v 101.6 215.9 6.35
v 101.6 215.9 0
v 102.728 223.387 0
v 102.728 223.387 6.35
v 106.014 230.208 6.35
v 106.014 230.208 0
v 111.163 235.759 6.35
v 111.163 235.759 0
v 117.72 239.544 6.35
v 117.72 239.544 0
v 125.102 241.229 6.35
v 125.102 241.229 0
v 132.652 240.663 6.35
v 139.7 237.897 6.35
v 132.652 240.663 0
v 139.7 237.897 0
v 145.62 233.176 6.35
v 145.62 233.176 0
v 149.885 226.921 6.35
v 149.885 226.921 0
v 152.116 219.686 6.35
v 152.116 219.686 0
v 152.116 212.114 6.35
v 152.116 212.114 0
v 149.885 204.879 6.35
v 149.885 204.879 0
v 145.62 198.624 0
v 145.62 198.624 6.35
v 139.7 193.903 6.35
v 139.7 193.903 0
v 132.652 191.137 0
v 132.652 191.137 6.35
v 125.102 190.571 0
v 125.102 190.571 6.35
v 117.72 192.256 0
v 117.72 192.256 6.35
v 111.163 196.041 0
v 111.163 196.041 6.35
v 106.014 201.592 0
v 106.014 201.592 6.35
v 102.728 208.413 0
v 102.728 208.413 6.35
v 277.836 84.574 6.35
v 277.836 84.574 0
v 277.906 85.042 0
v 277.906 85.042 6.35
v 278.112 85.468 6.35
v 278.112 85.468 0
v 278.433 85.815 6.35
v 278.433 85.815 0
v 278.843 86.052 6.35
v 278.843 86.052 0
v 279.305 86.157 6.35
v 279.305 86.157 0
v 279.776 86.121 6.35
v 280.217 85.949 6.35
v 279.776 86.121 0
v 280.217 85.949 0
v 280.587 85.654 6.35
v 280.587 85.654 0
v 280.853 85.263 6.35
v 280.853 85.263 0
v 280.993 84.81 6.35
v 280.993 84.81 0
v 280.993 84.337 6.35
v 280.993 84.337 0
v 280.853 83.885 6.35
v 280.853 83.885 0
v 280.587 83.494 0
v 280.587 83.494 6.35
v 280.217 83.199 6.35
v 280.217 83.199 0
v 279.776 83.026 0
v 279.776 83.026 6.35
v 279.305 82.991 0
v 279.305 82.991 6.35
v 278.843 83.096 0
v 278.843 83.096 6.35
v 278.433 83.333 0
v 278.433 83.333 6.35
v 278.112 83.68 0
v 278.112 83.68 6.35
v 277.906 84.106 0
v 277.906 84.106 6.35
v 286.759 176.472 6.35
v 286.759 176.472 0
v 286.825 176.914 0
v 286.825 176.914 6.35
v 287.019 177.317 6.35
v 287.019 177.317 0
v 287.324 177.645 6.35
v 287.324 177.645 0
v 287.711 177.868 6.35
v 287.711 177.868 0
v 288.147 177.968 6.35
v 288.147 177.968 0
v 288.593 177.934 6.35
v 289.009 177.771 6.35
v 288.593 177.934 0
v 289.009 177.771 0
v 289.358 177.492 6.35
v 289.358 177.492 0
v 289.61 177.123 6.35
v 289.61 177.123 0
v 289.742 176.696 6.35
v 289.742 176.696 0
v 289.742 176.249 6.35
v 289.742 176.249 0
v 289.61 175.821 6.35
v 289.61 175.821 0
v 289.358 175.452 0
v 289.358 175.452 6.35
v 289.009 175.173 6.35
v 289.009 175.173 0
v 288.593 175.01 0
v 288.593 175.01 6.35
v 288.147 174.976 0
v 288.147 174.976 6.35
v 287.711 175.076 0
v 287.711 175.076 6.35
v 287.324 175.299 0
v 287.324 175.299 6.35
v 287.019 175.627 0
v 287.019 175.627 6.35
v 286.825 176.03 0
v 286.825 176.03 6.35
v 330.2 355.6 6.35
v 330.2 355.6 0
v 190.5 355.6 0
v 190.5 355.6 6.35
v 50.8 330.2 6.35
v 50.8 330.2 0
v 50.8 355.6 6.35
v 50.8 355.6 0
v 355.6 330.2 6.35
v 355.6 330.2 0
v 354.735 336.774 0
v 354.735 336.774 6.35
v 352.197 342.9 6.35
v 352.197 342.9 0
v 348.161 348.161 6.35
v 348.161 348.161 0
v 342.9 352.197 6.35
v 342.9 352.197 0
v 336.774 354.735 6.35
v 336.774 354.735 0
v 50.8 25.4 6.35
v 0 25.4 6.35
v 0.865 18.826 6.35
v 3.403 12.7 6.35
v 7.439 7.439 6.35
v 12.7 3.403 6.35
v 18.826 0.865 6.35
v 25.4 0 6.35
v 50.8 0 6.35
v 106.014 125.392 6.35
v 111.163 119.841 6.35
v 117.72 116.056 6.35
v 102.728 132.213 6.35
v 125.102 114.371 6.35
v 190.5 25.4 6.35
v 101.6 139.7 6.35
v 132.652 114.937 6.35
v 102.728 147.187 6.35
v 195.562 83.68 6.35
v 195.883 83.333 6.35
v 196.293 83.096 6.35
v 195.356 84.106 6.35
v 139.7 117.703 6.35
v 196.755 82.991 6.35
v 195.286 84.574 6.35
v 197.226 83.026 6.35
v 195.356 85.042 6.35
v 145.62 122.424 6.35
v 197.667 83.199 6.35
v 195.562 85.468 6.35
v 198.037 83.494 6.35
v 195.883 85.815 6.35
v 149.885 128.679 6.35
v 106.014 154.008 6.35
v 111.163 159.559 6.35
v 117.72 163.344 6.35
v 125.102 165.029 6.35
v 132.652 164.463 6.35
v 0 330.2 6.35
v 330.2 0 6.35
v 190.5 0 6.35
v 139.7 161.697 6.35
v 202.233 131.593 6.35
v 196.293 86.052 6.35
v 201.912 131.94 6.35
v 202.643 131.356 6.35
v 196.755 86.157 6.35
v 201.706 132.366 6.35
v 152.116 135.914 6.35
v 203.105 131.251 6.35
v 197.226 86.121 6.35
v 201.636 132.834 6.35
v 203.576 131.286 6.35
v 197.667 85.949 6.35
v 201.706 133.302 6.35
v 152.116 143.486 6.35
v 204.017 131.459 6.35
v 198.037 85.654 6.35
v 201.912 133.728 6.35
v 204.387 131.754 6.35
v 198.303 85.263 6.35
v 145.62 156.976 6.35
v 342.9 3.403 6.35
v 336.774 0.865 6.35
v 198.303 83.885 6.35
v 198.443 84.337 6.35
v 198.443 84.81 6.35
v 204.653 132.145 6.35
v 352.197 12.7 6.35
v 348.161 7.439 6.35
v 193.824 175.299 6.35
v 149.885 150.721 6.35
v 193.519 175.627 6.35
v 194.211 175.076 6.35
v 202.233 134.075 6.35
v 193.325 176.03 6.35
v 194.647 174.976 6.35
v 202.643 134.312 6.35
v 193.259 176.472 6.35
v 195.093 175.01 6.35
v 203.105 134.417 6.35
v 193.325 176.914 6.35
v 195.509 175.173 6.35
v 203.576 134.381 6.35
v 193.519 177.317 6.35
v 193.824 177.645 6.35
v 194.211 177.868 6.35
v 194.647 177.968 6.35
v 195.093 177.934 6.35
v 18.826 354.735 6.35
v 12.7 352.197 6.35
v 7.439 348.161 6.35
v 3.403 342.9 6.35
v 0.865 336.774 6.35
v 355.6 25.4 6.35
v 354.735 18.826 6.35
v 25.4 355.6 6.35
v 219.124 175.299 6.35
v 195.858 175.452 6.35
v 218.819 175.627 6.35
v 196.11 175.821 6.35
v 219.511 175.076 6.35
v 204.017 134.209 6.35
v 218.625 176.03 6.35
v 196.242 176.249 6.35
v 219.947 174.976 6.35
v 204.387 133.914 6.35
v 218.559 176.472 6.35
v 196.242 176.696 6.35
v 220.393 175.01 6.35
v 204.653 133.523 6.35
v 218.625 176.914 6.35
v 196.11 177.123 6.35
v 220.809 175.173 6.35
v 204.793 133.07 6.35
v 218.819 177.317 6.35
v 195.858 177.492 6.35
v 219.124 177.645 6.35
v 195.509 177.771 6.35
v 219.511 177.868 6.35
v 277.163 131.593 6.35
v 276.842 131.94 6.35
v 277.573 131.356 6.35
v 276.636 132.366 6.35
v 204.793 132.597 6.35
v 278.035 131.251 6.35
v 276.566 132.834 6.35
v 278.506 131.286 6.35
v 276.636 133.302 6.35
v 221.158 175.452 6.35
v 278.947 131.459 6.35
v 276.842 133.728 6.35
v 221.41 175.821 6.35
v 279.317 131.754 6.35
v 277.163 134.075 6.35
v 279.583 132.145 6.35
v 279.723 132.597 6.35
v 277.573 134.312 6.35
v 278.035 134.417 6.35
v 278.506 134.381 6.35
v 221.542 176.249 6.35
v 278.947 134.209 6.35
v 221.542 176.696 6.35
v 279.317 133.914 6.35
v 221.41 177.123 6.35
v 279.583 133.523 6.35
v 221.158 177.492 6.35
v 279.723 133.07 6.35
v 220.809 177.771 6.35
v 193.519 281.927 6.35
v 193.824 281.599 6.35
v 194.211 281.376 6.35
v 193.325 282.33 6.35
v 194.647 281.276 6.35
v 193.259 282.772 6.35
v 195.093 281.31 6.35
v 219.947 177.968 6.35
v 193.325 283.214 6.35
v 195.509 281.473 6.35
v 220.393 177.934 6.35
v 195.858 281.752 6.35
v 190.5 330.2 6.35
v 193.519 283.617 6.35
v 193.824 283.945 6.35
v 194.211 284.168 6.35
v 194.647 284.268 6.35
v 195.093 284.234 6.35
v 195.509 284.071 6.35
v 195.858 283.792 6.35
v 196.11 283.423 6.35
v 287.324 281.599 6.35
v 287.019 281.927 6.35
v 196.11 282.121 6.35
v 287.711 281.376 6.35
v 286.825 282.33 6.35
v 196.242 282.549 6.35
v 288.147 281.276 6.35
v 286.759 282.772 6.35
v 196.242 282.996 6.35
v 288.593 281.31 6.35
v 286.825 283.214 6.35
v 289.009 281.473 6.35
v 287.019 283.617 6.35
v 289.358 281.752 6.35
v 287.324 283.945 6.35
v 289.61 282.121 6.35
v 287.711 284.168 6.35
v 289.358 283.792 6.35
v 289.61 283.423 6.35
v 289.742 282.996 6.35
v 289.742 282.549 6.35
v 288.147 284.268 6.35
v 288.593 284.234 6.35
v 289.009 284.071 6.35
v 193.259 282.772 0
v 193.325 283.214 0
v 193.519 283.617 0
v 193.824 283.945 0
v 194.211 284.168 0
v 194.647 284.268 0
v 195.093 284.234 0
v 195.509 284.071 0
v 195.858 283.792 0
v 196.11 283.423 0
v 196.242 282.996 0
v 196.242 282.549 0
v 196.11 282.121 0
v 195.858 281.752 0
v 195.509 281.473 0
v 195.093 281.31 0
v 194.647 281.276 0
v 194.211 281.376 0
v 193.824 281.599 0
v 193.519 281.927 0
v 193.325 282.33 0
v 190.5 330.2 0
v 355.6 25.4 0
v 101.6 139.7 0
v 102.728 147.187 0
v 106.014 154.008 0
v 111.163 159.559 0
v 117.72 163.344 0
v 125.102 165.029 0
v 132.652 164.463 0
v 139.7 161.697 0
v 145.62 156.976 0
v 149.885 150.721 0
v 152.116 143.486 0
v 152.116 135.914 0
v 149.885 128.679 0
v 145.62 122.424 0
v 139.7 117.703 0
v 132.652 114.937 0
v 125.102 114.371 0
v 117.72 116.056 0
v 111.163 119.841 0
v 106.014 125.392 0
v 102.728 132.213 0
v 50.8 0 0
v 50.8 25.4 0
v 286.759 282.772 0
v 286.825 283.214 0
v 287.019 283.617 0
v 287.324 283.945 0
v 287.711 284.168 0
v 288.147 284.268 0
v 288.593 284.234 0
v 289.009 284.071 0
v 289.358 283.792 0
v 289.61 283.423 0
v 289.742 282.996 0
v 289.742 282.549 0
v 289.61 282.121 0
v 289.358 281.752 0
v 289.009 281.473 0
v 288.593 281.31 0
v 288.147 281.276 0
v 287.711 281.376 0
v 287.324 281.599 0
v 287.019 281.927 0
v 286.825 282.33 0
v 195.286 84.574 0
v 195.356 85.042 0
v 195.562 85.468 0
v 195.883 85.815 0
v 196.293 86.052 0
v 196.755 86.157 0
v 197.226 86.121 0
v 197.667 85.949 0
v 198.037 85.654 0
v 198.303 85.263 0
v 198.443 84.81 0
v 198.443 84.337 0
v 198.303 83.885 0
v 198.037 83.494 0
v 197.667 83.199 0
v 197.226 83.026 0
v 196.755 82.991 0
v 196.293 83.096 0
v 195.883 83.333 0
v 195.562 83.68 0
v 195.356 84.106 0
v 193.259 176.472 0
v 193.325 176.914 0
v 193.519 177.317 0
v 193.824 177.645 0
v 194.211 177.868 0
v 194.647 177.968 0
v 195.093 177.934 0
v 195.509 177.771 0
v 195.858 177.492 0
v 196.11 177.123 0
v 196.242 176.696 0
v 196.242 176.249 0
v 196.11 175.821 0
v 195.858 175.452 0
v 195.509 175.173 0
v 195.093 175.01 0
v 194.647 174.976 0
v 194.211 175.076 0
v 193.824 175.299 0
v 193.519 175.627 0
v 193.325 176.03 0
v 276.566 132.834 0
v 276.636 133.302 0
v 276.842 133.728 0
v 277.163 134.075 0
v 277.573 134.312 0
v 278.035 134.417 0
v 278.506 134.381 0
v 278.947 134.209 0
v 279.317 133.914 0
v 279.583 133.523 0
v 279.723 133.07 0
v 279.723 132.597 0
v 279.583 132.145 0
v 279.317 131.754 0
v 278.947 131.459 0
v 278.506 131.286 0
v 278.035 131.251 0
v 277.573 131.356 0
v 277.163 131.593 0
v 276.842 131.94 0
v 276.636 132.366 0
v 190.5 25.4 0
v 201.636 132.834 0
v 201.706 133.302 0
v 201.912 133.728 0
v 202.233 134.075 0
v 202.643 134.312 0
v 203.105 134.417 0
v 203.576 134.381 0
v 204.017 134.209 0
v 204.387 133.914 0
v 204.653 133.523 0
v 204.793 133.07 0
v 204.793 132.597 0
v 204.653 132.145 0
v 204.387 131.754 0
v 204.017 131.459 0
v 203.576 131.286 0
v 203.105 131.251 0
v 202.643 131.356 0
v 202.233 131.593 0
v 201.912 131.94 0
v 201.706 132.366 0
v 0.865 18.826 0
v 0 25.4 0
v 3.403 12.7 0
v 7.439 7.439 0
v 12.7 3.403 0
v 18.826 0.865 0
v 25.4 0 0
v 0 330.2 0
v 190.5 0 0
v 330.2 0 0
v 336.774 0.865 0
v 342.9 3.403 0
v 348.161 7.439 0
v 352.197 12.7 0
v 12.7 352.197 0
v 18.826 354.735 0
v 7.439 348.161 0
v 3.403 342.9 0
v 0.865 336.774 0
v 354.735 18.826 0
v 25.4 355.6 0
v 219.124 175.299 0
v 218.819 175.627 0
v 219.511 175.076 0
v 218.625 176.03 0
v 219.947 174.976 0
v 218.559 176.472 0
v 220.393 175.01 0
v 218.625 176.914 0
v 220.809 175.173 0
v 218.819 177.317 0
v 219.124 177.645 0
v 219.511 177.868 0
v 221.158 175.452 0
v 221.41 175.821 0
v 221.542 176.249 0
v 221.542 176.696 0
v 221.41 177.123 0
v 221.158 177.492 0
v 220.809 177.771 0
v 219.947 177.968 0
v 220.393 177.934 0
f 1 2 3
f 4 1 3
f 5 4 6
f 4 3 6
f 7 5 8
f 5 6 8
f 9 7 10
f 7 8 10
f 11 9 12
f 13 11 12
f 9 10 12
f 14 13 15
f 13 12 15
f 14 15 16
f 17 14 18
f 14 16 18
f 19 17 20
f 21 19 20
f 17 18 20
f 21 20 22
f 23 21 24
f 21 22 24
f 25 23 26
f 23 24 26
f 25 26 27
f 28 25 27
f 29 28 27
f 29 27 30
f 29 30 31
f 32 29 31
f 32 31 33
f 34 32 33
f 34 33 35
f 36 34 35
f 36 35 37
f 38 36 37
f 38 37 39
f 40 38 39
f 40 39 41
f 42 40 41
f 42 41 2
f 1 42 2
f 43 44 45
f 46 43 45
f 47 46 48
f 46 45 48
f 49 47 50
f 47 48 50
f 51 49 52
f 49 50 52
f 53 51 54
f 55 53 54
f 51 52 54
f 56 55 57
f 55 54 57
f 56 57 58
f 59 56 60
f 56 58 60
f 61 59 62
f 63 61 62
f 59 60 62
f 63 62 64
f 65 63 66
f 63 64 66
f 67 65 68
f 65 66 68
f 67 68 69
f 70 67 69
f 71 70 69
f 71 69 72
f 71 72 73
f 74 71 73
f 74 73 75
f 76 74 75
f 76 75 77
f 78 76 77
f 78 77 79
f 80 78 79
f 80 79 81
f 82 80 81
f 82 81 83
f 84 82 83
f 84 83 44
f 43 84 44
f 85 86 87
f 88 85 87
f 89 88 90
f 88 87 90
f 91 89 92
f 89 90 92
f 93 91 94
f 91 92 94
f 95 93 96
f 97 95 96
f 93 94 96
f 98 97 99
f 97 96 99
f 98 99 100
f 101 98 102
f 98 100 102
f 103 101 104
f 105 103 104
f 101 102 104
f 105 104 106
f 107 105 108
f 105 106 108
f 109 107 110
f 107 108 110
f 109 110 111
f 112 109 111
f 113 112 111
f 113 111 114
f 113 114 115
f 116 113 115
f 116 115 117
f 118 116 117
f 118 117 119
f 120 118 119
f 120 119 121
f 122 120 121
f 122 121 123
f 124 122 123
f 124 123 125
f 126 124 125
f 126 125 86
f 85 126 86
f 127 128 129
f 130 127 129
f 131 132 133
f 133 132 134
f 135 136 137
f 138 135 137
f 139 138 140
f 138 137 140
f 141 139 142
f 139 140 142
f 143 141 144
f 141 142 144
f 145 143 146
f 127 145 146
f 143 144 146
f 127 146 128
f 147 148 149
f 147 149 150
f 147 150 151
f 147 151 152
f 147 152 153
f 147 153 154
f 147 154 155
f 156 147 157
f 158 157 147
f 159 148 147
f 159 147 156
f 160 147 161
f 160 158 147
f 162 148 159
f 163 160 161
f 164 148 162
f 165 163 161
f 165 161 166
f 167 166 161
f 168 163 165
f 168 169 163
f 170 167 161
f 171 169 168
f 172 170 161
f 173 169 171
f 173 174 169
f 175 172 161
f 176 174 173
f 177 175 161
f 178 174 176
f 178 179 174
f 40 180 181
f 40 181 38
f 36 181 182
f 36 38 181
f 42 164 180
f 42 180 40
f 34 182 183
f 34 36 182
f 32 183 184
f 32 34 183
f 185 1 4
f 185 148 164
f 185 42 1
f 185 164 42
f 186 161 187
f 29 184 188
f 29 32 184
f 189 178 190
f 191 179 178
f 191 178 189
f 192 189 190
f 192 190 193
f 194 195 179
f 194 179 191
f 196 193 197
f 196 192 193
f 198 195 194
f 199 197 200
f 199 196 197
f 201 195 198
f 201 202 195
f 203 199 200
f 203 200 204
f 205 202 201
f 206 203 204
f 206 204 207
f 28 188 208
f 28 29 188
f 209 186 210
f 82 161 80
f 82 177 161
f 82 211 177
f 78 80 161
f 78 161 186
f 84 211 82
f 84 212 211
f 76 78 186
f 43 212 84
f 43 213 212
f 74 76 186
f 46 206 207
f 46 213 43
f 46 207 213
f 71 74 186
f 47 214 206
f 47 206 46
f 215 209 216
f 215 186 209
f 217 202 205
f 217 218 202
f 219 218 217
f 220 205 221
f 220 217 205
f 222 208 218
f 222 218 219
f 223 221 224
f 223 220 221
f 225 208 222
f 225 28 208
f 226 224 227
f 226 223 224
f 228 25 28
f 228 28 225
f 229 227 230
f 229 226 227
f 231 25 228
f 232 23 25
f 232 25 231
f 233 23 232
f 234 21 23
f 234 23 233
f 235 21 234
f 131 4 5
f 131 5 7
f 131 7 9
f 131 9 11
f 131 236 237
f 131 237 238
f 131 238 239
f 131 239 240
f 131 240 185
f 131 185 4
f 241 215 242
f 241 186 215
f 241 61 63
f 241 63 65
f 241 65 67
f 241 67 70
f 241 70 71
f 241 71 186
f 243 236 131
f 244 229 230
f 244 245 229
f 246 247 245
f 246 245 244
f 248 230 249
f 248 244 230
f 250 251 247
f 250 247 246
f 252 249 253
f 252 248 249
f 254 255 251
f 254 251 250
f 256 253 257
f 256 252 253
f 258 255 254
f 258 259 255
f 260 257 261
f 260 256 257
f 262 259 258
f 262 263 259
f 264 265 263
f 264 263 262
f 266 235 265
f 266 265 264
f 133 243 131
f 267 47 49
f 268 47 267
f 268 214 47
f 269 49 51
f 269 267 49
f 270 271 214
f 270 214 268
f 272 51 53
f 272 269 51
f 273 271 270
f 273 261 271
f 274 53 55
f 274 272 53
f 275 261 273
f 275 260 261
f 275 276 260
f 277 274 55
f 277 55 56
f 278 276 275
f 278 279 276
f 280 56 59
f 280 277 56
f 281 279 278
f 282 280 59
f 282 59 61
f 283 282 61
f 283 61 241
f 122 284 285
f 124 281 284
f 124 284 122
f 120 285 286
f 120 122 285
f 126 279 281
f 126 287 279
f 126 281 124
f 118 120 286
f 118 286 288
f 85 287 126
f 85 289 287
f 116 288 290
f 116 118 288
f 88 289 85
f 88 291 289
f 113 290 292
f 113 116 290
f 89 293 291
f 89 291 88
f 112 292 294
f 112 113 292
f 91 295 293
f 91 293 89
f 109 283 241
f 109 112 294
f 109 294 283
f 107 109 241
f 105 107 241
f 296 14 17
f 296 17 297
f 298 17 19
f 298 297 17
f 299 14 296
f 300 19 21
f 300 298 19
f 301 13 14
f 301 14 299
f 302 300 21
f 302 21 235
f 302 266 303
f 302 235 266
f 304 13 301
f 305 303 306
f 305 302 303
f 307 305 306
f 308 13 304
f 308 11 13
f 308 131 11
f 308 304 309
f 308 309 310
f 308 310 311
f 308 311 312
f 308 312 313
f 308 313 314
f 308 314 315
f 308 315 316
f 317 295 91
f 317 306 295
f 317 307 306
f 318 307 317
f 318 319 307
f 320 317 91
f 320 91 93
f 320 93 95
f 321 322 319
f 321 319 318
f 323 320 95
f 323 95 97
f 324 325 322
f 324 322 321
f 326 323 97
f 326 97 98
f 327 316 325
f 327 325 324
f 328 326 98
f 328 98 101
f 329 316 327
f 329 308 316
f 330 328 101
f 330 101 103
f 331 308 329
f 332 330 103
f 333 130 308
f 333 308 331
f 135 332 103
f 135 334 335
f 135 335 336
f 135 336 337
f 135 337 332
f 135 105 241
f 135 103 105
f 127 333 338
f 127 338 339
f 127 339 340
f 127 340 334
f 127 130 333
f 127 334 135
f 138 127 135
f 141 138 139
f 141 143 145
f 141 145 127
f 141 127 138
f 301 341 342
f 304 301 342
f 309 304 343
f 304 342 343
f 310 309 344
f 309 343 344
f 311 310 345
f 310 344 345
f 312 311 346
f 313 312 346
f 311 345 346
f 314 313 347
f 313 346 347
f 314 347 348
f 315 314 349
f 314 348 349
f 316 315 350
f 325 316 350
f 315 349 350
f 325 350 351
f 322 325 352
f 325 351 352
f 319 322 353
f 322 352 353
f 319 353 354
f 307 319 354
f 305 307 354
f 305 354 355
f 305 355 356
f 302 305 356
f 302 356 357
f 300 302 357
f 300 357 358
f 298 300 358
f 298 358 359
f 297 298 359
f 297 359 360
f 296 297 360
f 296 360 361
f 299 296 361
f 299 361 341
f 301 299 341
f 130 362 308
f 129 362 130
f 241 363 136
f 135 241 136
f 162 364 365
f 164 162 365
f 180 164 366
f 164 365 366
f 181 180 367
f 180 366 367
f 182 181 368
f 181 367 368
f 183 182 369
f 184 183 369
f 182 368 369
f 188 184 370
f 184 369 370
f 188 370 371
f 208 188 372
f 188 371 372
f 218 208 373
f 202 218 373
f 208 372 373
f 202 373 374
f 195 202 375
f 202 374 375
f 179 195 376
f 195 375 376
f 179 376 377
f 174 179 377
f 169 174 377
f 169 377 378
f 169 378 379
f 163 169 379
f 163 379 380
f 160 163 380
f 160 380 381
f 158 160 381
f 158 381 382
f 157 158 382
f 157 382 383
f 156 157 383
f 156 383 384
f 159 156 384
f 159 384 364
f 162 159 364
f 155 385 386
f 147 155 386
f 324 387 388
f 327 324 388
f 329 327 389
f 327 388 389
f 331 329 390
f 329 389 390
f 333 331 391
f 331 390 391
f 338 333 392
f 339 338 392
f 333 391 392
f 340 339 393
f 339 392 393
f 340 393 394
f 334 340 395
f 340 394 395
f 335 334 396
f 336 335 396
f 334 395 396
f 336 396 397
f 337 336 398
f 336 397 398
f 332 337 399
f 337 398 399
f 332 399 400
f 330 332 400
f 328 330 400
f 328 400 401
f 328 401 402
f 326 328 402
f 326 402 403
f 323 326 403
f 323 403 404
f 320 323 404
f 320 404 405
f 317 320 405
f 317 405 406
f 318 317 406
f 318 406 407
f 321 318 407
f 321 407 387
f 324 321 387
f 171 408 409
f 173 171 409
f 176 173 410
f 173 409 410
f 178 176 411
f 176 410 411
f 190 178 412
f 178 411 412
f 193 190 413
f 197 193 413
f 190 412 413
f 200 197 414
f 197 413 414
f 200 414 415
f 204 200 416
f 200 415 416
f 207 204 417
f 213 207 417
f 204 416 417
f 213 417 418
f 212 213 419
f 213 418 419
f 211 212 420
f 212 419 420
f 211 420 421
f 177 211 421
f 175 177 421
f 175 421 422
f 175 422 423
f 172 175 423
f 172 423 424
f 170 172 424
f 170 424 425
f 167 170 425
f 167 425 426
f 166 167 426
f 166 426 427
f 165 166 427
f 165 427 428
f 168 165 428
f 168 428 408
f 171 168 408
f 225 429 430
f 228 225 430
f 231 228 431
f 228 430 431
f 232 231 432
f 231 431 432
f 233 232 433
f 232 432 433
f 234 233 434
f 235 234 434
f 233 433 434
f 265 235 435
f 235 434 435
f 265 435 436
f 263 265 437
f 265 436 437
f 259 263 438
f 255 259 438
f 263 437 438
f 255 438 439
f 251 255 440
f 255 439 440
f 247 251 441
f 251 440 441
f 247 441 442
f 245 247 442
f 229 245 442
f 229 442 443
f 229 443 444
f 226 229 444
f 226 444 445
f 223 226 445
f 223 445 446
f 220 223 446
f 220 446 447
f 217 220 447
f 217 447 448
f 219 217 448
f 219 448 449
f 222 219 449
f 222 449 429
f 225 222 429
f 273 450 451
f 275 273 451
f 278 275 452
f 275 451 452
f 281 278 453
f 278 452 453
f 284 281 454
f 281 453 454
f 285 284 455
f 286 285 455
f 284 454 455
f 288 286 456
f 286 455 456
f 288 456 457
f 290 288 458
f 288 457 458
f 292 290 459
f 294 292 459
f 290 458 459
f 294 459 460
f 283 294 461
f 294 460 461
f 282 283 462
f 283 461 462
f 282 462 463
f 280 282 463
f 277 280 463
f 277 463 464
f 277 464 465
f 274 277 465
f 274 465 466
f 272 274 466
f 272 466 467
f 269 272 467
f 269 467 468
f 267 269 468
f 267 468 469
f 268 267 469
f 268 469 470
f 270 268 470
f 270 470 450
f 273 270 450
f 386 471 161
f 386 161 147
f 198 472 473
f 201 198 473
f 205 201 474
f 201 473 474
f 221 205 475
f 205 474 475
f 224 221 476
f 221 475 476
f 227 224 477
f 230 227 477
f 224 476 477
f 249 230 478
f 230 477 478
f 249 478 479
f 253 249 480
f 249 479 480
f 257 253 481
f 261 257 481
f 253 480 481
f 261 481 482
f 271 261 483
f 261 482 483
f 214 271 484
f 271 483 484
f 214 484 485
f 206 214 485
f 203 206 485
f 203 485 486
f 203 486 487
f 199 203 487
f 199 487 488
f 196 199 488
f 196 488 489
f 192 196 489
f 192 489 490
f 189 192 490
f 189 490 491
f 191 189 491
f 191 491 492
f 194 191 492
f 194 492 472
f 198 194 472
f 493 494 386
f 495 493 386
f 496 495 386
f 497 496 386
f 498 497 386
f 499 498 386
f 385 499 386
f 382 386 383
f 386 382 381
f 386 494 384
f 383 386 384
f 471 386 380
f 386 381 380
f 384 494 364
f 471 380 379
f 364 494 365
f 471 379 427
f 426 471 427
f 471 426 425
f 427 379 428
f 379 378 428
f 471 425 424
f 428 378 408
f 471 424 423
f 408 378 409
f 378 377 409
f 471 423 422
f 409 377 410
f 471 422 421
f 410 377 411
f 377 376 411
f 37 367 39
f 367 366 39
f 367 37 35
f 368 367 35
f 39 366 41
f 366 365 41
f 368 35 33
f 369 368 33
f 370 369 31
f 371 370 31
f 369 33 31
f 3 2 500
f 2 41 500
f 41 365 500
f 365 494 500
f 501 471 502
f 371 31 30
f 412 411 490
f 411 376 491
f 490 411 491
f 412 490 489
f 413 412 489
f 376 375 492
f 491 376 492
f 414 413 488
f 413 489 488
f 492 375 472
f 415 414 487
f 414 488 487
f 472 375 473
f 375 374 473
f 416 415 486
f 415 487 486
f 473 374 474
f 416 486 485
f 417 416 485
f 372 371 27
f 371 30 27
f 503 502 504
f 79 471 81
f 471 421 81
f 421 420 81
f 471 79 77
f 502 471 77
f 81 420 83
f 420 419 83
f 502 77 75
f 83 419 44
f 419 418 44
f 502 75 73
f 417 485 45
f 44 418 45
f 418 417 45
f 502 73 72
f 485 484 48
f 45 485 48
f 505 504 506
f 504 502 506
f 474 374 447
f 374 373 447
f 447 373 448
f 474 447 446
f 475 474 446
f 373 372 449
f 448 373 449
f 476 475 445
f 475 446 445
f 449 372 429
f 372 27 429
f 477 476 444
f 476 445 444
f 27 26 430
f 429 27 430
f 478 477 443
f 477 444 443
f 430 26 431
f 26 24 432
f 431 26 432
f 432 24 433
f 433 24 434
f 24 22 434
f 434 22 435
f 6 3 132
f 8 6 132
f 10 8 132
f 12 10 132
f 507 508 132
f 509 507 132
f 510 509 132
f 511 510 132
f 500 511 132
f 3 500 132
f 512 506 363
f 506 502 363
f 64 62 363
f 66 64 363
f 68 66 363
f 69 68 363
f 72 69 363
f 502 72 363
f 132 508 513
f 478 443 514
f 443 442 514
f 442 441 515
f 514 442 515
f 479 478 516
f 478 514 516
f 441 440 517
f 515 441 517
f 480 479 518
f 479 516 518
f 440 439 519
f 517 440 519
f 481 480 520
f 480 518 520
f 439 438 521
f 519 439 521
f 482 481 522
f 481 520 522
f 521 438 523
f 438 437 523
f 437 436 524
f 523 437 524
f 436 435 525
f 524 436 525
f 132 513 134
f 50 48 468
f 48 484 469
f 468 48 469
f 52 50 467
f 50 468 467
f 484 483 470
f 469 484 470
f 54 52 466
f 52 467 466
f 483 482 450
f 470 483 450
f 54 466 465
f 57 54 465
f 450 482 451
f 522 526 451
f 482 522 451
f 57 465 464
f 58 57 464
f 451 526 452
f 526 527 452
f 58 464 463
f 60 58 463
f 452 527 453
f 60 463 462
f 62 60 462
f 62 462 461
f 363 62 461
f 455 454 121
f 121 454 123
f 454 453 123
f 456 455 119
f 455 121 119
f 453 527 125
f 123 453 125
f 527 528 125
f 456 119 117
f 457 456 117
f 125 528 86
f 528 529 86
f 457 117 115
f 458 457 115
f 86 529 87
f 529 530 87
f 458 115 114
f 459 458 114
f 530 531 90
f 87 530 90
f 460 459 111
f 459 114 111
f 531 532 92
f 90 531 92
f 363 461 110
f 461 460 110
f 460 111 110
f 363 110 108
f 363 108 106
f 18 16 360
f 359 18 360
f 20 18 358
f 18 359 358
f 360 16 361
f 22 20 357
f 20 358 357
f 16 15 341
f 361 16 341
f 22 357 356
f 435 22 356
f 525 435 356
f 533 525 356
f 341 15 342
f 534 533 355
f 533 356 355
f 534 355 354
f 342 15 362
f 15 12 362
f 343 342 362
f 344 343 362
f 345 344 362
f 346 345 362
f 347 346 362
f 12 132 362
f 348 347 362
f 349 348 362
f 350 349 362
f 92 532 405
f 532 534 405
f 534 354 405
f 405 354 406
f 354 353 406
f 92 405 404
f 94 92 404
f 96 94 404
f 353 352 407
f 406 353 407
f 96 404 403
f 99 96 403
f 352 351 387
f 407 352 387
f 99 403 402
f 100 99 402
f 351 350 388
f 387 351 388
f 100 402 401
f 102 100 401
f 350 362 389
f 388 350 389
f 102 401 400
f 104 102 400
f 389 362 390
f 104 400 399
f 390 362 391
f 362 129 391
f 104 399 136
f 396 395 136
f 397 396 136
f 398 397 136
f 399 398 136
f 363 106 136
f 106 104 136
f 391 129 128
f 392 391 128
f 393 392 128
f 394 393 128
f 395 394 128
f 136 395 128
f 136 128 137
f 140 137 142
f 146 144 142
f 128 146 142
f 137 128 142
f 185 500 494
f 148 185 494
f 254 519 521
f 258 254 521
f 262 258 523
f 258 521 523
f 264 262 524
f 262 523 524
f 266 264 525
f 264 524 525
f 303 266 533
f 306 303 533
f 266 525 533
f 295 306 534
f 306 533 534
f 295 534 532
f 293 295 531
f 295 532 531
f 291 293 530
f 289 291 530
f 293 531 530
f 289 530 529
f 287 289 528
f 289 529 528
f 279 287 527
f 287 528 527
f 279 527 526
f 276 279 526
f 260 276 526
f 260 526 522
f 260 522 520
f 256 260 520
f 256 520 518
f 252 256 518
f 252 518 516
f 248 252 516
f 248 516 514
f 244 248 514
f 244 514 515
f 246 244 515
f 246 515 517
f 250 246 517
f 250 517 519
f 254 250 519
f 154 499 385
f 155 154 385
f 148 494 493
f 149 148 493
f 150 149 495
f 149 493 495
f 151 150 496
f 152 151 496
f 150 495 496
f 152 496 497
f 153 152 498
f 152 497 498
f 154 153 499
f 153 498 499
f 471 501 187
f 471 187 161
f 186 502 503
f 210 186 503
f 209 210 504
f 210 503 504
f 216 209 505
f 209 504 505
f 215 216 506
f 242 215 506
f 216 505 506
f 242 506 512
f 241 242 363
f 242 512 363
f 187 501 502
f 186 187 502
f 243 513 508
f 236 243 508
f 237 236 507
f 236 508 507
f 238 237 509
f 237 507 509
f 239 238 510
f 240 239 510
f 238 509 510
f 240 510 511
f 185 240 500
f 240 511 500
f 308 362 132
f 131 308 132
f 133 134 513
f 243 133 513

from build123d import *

# Parameters (mm, degrees)
BOSS_EXTRUDE1_DEPTH = 6.35
SKETCH2_W           = 139.7
SKETCH2_H           = 25.4
CUT_EXTRUDE1_DEPTH  = 503.934431611
SKETCH4_R           = 1.5875
SKETCH4_R_2         = 1.5
SKETCH4_R_3         = 25.4
CUT_EXTRUDE2_DEPTH  = 503.934431611


with BuildPart() as part:
    # Sketch1 → Boss-Extrude1 (new body)
    with BuildSketch(Plane.XY):
        with BuildLine():
            Line((25.4, 0), (330.2, 0))
            ThreePointArc((330.2, 0), (348.160512242, 7.439487758), (355.6, 25.4))
            Line((355.6, 25.4), (355.6, 330.2))
            ThreePointArc((355.6, 330.2), (348.160512242, 348.160512242), (330.2, 355.6))
            Line((330.2, 355.6), (25.4, 355.6))
            ThreePointArc((25.4, 355.6), (7.439487758, 348.160512242), (0, 330.2))
            Line((0, 330.2), (0, 25.4))
            ThreePointArc((0, 25.4), (7.439487758, 7.439487758), (25.4, 0))
        make_face()
    extrude(amount=BOSS_EXTRUDE1_DEPTH)

    # Sketch2 → Cut-Extrude1 (cut, through all)
    with BuildSketch(Plane(origin=(0, 0, 0), x_dir=(-1, 0, 0), z_dir=(0, 0, -1))):
        with Locations((-120.65, 342.9)):
            Rectangle(SKETCH2_W, SKETCH2_H)
        with Locations((-120.65, 12.7)):
            Rectangle(SKETCH2_W, SKETCH2_H)
    extrude(amount=-CUT_EXTRUDE1_DEPTH, mode=Mode.SUBTRACT)

    # Sketch4 → Cut-Extrude2 (cut, through all)
    with BuildSketch(Plane(origin=(0, 0, 0), x_dir=(-1, 0, 0), z_dir=(0, 0, -1))):
        with Locations((-279.42318149, 84.573787042)):
            Circle(SKETCH4_R)
        with Locations((-278.15318149, 132.833787042)):
            Circle(SKETCH4_R)
        with Locations((-196.87318149, 84.573787042)):
            Circle(SKETCH4_R)
        with Locations((-203.22318149, 132.833787042)):
            Circle(SKETCH4_R)
        with Locations((-288.258815439, 176.472066732)):
            Circle(SKETCH4_R_2)
        with Locations((-220.058815439, 176.472066732)):
            Circle(SKETCH4_R_2)
        with Locations((-194.758815439, 176.472066732)):
            Circle(SKETCH4_R_2)
        with Locations((-288.258815439, 282.772066732)):
            Circle(SKETCH4_R_2)
        with Locations((-194.758815439, 282.772066732)):
            Circle(SKETCH4_R_2)
        with Locations((-127, 215.9)):
            Circle(SKETCH4_R_3)
        with Locations((-127, 139.7)):
            Circle(SKETCH4_R_3)
    extrude(amount=-CUT_EXTRUDE2_DEPTH, mode=Mode.SUBTRACT)


solid = part.part
